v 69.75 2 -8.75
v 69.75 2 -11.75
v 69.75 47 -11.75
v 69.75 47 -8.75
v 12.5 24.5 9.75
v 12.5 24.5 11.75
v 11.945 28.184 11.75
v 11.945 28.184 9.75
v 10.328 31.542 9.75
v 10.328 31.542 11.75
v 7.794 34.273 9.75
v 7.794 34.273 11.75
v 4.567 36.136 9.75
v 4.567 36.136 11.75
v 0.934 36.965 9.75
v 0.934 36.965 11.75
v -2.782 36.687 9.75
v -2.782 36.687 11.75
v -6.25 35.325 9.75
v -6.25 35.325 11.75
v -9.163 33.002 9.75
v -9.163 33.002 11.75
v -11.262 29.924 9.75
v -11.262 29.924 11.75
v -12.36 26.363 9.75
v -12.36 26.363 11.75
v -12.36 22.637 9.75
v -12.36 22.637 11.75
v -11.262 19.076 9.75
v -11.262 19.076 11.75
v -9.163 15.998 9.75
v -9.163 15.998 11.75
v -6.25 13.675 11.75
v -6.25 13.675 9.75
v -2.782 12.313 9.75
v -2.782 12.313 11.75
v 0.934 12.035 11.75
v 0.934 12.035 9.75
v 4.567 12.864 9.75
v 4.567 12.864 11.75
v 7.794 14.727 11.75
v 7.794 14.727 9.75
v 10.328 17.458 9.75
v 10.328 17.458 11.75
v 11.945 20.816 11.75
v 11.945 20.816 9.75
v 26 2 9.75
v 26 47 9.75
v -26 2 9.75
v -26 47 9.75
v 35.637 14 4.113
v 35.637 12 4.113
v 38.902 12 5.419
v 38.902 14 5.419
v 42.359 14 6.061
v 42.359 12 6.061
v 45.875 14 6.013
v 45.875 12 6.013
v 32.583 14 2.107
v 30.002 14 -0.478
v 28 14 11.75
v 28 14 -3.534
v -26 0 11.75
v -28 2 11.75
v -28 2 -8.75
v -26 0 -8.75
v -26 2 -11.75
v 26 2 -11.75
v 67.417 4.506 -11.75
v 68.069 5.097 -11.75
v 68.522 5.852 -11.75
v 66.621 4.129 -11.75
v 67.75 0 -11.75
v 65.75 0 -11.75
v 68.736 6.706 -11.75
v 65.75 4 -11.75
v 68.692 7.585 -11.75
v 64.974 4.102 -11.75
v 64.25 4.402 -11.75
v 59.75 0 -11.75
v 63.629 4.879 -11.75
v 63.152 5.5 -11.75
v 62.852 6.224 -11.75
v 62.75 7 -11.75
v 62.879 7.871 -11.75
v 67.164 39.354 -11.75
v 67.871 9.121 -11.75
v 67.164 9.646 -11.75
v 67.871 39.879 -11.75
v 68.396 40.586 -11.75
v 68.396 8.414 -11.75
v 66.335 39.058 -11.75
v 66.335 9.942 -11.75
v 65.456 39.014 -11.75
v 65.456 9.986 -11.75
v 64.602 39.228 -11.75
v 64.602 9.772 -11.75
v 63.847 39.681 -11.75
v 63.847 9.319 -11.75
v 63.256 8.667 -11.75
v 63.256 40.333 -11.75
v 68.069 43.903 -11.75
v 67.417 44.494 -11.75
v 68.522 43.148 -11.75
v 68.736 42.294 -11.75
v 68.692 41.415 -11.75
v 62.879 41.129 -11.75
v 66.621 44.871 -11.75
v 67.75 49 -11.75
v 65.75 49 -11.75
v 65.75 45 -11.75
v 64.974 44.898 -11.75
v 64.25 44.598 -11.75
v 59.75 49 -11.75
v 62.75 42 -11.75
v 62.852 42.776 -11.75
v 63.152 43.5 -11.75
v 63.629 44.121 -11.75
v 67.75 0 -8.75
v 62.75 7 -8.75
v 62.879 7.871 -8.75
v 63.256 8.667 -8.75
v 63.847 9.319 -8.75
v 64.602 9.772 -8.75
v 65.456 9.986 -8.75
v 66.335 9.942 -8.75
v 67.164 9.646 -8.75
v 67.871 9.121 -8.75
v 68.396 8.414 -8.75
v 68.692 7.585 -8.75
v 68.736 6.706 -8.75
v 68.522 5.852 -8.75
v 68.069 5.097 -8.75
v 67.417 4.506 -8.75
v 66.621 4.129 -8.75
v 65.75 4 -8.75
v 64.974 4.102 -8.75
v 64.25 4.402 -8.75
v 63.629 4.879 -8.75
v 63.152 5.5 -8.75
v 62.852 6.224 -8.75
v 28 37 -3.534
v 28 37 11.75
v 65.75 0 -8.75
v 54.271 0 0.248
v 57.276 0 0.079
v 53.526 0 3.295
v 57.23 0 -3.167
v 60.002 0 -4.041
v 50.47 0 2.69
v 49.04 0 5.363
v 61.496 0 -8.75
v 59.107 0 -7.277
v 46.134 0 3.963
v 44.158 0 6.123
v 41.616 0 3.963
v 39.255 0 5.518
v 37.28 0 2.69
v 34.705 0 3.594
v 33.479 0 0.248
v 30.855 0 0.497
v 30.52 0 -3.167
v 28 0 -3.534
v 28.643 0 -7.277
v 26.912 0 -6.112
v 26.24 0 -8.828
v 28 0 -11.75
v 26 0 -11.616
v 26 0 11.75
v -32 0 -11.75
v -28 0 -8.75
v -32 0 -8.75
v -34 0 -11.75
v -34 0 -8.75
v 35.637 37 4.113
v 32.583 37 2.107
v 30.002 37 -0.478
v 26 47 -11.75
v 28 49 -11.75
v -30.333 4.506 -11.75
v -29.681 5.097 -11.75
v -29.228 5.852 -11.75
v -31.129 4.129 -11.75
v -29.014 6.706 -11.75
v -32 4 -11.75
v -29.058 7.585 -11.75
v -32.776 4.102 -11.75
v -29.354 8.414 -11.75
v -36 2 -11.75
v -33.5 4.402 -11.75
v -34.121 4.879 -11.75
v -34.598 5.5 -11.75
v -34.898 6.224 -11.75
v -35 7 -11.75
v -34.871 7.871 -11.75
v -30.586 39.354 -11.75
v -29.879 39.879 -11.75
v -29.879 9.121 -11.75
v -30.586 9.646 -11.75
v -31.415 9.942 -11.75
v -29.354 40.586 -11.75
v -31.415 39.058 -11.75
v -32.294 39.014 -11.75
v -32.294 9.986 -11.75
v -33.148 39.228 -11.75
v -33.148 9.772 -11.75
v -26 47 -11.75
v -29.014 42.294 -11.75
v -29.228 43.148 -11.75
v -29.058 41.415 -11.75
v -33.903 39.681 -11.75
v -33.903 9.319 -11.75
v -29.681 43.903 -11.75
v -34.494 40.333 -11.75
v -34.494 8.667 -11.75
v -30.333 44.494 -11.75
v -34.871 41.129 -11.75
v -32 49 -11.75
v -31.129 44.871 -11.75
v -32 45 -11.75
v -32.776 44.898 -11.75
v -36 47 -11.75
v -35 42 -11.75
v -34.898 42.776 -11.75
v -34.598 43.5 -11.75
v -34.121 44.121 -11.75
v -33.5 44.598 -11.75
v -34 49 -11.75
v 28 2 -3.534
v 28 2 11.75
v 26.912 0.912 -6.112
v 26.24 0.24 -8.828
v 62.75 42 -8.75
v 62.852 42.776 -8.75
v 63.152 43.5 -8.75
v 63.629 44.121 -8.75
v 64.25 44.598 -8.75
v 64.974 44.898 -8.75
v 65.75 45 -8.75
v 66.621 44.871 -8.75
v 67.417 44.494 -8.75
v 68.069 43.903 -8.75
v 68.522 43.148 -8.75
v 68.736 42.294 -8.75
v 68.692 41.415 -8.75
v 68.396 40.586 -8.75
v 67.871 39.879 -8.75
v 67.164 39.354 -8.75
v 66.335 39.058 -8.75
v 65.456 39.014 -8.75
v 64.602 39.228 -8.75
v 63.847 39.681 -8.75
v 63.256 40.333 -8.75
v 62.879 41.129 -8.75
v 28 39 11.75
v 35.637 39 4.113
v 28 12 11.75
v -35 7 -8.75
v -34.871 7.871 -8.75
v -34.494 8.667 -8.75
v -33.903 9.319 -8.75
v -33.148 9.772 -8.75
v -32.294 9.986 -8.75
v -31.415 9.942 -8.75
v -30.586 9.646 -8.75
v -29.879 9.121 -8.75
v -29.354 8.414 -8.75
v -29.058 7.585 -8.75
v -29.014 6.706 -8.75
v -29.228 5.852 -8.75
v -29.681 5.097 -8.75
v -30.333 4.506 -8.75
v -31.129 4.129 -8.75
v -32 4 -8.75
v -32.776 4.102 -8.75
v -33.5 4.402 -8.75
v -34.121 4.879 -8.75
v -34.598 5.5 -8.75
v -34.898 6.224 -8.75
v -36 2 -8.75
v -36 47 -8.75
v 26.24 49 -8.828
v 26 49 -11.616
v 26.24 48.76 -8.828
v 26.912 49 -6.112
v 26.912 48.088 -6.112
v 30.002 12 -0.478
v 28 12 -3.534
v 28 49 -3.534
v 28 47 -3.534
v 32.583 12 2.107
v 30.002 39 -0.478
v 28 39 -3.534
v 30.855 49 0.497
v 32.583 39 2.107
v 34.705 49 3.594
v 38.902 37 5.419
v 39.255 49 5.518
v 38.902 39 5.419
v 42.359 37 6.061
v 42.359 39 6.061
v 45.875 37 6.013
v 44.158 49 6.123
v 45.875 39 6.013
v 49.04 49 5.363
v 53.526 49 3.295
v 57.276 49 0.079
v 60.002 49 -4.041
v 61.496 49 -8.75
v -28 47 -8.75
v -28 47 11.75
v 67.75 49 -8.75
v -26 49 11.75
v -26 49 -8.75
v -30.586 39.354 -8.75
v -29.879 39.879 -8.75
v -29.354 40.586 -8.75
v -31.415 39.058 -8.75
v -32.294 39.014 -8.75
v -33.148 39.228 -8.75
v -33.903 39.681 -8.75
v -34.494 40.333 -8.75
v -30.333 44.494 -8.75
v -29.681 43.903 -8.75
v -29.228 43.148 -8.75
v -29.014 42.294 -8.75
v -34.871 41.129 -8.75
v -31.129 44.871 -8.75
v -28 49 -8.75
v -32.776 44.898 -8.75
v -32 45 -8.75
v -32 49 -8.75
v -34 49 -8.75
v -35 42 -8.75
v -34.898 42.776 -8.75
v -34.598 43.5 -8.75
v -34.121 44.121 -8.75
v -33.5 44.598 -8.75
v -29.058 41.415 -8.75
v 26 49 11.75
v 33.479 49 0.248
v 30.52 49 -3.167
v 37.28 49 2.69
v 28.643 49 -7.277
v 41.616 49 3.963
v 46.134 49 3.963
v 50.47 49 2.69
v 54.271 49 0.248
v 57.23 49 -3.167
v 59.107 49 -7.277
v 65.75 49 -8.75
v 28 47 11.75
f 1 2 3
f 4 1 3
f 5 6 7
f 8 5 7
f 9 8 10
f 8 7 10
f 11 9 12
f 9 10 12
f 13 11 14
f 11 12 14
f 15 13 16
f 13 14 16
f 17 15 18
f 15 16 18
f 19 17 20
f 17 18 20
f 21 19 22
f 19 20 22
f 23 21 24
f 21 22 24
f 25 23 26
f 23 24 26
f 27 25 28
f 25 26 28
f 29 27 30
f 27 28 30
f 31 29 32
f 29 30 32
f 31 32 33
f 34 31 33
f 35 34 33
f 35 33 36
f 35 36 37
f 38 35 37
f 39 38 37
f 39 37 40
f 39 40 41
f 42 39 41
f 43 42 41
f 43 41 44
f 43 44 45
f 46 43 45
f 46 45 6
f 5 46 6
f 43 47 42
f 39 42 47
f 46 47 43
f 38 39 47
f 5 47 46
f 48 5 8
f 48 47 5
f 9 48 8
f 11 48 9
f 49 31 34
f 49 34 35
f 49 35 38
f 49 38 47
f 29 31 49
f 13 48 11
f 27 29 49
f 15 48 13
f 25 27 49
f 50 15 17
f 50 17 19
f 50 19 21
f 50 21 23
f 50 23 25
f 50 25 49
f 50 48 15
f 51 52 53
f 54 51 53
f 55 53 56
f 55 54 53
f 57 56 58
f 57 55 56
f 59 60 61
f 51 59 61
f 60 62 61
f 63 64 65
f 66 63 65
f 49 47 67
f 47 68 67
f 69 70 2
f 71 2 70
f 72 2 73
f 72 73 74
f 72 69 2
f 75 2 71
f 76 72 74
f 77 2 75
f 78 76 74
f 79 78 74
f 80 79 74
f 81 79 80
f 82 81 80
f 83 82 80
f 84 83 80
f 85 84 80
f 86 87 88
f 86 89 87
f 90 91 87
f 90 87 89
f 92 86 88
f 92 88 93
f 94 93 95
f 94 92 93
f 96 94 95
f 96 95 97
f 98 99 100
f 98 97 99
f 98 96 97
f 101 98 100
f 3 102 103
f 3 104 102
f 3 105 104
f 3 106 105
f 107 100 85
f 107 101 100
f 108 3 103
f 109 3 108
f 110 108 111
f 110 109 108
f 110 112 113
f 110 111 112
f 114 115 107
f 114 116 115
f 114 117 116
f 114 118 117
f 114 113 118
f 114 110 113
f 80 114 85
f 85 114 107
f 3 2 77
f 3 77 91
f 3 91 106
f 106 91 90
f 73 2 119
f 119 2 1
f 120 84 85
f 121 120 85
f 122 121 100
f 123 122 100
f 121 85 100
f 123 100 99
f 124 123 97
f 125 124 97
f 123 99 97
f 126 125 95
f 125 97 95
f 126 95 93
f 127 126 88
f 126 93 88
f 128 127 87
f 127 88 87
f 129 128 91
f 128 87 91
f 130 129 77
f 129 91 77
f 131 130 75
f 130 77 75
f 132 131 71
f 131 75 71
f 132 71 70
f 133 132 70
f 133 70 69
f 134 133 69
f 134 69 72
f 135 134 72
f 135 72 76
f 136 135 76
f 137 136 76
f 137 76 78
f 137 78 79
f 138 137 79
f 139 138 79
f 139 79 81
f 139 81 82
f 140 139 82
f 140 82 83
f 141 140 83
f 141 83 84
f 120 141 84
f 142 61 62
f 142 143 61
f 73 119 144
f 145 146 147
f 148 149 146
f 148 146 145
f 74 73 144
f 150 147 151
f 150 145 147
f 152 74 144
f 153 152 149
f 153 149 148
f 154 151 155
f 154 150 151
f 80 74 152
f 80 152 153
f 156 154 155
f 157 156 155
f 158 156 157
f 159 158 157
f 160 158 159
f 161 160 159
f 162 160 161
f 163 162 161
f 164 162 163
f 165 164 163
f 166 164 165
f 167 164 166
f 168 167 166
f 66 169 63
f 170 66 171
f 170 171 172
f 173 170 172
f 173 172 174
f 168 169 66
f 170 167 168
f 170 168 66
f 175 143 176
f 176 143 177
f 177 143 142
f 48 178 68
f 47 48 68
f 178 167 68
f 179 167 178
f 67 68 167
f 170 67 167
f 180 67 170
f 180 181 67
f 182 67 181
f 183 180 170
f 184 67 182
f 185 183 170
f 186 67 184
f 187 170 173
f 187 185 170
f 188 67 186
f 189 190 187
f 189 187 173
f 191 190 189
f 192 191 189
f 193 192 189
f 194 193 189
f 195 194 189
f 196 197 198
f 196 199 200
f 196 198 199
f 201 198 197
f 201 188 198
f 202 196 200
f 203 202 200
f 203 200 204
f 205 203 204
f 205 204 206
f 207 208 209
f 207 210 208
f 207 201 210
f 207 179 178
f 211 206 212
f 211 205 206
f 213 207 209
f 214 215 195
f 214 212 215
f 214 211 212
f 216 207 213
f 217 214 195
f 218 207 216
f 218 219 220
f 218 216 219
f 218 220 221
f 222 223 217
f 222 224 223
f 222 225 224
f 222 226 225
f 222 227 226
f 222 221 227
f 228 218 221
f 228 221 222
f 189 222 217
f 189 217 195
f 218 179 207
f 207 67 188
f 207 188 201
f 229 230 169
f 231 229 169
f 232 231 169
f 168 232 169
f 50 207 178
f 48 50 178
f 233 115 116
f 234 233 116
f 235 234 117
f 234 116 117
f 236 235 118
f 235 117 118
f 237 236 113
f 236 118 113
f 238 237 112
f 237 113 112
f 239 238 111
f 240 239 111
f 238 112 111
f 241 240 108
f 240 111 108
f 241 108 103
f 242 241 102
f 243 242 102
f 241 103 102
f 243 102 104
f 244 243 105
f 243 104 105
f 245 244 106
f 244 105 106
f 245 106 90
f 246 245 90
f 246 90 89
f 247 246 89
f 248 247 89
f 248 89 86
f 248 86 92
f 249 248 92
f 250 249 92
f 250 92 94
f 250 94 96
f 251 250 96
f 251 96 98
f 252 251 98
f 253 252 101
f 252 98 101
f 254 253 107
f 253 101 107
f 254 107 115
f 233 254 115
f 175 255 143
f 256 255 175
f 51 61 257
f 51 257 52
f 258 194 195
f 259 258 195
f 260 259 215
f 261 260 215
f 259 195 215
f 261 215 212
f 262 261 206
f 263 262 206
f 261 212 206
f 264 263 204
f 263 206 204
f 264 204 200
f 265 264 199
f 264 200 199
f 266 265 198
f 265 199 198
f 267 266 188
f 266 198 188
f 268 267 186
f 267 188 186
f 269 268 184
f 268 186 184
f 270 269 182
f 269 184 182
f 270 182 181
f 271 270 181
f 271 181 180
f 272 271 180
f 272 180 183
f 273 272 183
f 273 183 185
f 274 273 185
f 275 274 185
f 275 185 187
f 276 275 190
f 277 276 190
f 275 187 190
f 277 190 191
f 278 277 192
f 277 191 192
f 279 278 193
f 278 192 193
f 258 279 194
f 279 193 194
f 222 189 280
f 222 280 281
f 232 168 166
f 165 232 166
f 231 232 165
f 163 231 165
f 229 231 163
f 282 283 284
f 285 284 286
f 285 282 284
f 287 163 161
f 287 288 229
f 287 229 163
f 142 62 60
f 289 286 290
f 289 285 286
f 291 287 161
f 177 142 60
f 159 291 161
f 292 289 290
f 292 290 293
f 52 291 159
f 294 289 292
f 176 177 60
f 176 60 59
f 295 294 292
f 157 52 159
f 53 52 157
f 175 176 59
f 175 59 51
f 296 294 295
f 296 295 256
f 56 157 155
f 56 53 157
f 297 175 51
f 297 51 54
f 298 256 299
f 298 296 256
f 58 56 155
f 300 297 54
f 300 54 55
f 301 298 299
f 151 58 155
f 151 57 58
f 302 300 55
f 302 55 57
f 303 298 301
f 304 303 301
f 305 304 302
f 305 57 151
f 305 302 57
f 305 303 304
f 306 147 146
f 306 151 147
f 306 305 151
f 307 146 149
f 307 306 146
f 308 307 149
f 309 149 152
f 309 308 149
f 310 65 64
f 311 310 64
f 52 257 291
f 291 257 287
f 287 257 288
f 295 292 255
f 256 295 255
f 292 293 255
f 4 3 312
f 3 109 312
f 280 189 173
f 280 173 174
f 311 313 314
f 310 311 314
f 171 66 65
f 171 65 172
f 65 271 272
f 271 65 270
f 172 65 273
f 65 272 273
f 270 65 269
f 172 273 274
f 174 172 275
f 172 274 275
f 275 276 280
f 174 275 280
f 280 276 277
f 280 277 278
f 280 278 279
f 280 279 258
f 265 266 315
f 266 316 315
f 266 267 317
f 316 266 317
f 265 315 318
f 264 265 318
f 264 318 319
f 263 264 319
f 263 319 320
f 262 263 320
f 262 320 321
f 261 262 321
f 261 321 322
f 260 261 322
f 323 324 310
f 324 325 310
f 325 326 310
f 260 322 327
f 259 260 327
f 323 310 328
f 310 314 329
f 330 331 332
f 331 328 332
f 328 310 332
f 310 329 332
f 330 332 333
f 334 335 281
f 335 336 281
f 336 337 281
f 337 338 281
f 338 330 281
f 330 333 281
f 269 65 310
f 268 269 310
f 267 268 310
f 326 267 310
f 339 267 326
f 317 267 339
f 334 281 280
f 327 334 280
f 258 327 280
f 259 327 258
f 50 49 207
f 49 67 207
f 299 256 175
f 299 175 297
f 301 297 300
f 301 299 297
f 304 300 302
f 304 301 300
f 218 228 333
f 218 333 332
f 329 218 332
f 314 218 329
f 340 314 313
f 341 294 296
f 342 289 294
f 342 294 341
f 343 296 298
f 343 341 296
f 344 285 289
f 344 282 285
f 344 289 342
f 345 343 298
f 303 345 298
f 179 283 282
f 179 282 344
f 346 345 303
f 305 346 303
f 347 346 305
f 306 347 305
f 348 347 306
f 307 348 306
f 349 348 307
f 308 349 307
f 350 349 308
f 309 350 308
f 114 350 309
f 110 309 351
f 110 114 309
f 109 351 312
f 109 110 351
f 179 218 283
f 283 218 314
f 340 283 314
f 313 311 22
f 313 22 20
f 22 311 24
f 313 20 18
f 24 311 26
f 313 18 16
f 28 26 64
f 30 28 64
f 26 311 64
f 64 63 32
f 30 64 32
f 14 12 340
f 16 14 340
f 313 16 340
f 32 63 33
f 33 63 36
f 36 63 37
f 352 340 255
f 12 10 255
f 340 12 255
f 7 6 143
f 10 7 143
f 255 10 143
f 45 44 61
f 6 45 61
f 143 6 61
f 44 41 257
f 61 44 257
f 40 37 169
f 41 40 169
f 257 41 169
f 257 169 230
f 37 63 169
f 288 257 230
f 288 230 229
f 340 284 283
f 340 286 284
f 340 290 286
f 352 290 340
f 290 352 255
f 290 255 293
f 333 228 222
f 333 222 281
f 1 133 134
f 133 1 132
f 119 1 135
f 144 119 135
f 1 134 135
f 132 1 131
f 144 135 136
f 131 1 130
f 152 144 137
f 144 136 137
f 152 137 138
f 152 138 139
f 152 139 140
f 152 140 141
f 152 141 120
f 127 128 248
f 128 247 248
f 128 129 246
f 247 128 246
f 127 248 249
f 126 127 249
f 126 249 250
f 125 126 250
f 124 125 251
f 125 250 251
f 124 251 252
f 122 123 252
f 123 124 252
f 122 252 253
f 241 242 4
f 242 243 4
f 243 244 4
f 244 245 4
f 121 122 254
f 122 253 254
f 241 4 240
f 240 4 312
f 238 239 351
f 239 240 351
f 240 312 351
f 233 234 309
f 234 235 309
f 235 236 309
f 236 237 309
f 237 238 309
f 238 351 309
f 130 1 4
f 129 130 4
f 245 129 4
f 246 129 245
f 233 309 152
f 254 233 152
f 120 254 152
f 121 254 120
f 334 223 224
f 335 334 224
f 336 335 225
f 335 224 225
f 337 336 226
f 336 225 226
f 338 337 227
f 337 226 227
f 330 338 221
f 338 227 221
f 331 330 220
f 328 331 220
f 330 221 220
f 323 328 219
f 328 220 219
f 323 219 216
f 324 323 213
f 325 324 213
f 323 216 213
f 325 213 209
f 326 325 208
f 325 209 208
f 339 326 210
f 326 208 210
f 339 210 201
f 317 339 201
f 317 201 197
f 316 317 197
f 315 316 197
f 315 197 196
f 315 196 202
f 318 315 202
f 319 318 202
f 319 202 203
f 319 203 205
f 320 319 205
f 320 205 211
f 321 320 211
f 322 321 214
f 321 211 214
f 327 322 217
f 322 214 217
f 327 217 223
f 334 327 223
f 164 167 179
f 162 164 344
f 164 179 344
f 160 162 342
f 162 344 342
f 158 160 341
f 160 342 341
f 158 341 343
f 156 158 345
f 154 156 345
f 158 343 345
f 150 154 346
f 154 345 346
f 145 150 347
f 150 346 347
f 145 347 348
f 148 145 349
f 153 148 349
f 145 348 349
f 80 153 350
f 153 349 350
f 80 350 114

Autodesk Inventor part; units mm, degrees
ref_plane "YZ Plane" through (0, 0, 0) normal (1, 0, 0) x (0, 1, 0)
ref_plane "XZ Plane" through (0, 0, 0) normal (0, 1, 0) x (-1, 0, 0)
ref_plane "XY Plane" through (0, 0, 0) normal (0, 0, 1) x (1, 0, 0)
sketch "Esboço1" plane through (0, 0, 0) normal (0, 1, 0) x (-1, 0, 0)
  line L0 (-28, -11.75) -> (28, -11.75)
  line L1 (28, -11.75) -> (28, 11.75)
  line L2 (28, 11.75) -> (-28, 11.75)
  line L3 (-28, 11.75) -> (-28, -11.75)
  line L4 (-28, -11.75) -> (28, 11.75) construction
  line L5 (28, -11.75) -> (-28, 11.75) construction
  point P0 (0, 0)
  dimension "d0" = 56
  dimension "d1" = 23.5
extrude "Extrusão1" add sketch "Esboço1" along normal blind 49
sketch "Esboço2" plane through (28, 0, -11.75) normal (0, 0, -1) x (-1, 0, 0)
  line L0 (0, 49) -> (56, 49) projected
  line L1 (0, 49) -> (-33.75, 49)
  line L2 (-33.75, 49) -> (-33.75, 0)
  line L3 (0, 0) -> (56, 0) projected
  line L4 (-33.75, 0) -> (0, 0)
  line L5 (0, 0) -> (0, 49)
  point P0 (28, 0)
  dimension "d4" = 33.75
extrude "Extrusão2" add sketch "Esboço2" against normal blind 17.875
sketch "Esboço3" plane through (0, 49, 0) normal (0, 1, 0) x (1, 0, 0)
  line L0 (-28, 11.75) -> (61.75, 11.75) projected
  line L1 (61.75, 11.75) -> (59.75, 11.75)
  line L2 (59.75, 11.75) -> (43.875, 11.75)
  circle A0 centre (43.875, 11.75) radius 15.875
  point P0 (0, 0)
  dimension "d7" = 2
  dimension "d8" = 15.875
extrude "Extrusão3" cut sketch "Esboço3" against normal blind 49
sketch "Esboço4" plane through (61.75, 0, -11.75) normal (0, 0, -1) x (-1, 0, 0)
  line L0 (0, 49) -> (33.75, 49) projected
  line L1 (33.75, 0) -> (0, 0) projected
  line L2 (0, 49) -> (0, 0)
  line L3 (0, 0) -> (-8, 0)
  line L4 (-8, 0) -> (-8, 49)
  line L5 (-8, 49) -> (0, 49)
  line L6 (-4, 0) -> (-4, 7)
  line L7 (-4, 49) -> (-4, 42)
  circle A0 centre (-4, 42) radius 3
  circle A1 centre (-4, 7) radius 3
  point P0 (61.75, 0)
  dimension "d11" = 8
  dimension "d12" = 7
  dimension "d13" = 7
  dimension "d14" = 6
  dimension "d15" = 6
extrude "Extrusão4" add sketch "Esboço4" against normal blind 3
sketch "Esboço5" plane through (0, 49, 0) normal (0, 1, 0) x (1, 0, 0)
  arc A0 (28, 11.75) -> (59.75, 11.75) centre (43.875, 11.75) ccw projected
  circle A1 centre (43.875, 11.75) radius 17.875
  line L0 (61.75, -6.125) -> (28, -6.125) projected
  line L1 (69.75, 8.75) -> (61.75, 8.75) projected
  line L2 (61.75, 8.75) -> (61.4965, 8.75)
  line L3 (61.75, 8.75) -> (61.75, -6.125)
  line L4 (43.875, -6.125) -> (61.75, -6.125)
  line L5 (28, -11.75) -> (28, -6.125) projected
  line L6 (43.875, -6.125) -> (28, -6.125)
  line L7 (28, -6.125) -> (28, 3.5342)
  point P0 (0, 0)
extrude "Extrusão5" cut sketch "Esboço5" against normal blind 49 contours A1 L0 L7 | L2 L3 L0 A1
sketch "Esboço6" plane through (-28, 0, -11.75) normal (0, 0, -1) x (-1, 0, 0)
  line L0 (0, 0) -> (0, 49) projected
  line L1 (0, 49) -> (0, 0)
  line L2 (0, 0) -> (8, 0)
  line L3 (8, 0) -> (8, 49)
  line L4 (8, 49) -> (0, 49)
  line L5 (4, 49) -> (4, 42)
  line L6 (4, 0) -> (4, 7)
  circle A0 centre (4, 7) radius 3
  circle A1 centre (4, 42) radius 3
  point P0 (-28, 0)
  dimension "d20" = 8
  dimension "d21" = 7
  dimension "d22" = 7
  dimension "d23" = 6
  dimension "d24" = 6
extrude "Extrusão6" add sketch "Esboço6" against normal blind 3
sketch "Esboço8" plane through (28, 0, -11.75) normal (0, 0, -1) x (-1, 0, 0)
  line L0 (0, 49) -> (0, 0) projected
  line L1 (0, 49) -> (0, 47)
  line L2 (0, 47) -> (2, 47)
  line L3 (2, 47) -> (2, 2)
  line L4 (2, 47) -> (47, 47) construction
  line L5 (2, 2) -> (54, 2)
  line L6 (2, 2) -> (54, 2) construction
  line L7 (54, 2) -> (54, 47)
  line L8 (54, 47) -> (2, 47)
  point P0 (28, 0)
  dimension "d27" = 2
  dimension "d28" = 2
  dimension "d29" = 45
  dimension "d30" = 90
  dimension "d31" = 52
  dimension "d32" = 0
extrude "Extrusão7" cut sketch "Esboço8" against normal blind 21.5
sketch "Esboço9" plane through (-28, 0, 11.75) normal (0, 0, 1) x (1, 0, 0)
  circle A0 centre (28, 24.5) radius 12.5
  point P0 (28, 0)
  dimension "d35" = 25
extrude "Extrusão8" cut sketch "Esboço9" against normal blind 2
sketch "Esboço10" plane through (28, 0, 11.75) normal (1, 0, 0) x (0, 0, -1)
  line L0 (0, 0) -> (0, 49) projected
  line L1 (0, 49) -> (0, 37)
  line L2 (0, 0) -> (0, 12)
  line L3 (0, 12) -> (16, 12)
  line L4 (16, 12) -> (16, 14)
  line L5 (16, 14) -> (0, 14)
  line L6 (0, 12) -> (0, 14)
  line L7 (0, 37) -> (16, 37)
  line L8 (16, 37) -> (16, 39)
  line L9 (16, 39) -> (0, 39)
  point P0 (11.75, 0)
  dimension "d38" = 12
  dimension "d41" = 12
  dimension "d42" = 16
  dimension "d43" = 2
  dimension "d44" = 16
  dimension "d45" = 2
extrude "Extrusão9" add sketch "Esboço10" along normal blind 17.875
sketch "Esboço11" plane through (28, 39, 11.75) normal (0, 1, 0) x (1, 0, 0)
  arc A0 (0, 15.2842) -> (33.4965, 20.5) centre (15.875, 23.5) ccw projected
  arc A1 (0, 23.5) -> (31.75, 23.5) centre (15.875, 23.5) ccw projected
  line L0 (17.875, 0) -> (17.875, 5.7372) projected
  line L1 (17.875, 5.7372) -> (17.875, 0)
  line L2 (0, 0) -> (17.875, 0) projected
  line L3 (17.875, 0) -> (0, 0)
  line L4 (0, 0) -> (7.6367, 7.6367)
  arc A2 (0, 15.2842) -> (17.875, 5.7372) centre (15.875, 23.5) ccw projected
  arc A3 (7.6367, 7.6367) -> (17.875, 5.7372) centre (15.875, 23.5) ccw
  line L5 (1.8834, 16) -> (17.875, 16) projected
  line L6 (1.8834, 16) -> (17.875, 16)
  line L7 (17.875, 16) -> (17.875, 7.7515) projected
  line L8 (17.875, 16) -> (17.875, 7.7515)
  arc A4 (1.8834, 16) -> (17.875, 7.7515) centre (15.875, 23.5) ccw
  point P0 (-28, 11.75)
  dimension "d48" = 45
extrude "Extrusão10" cut sketch "Esboço11" against normal blind 27.875
chamfer "Chanfro1" distance 2 angle 45 8 edges at (28, 49, 4.1079) (28, 0, 4.1079) (-28, 0, 1.5) (-28, 49, 1.5) (69.75, 49, -10.25) (69.75, 0, -10.25) (-36, 49, -10.25) (-36, 0, -10.25)
properties part number "KS  Dianteiro Front"
